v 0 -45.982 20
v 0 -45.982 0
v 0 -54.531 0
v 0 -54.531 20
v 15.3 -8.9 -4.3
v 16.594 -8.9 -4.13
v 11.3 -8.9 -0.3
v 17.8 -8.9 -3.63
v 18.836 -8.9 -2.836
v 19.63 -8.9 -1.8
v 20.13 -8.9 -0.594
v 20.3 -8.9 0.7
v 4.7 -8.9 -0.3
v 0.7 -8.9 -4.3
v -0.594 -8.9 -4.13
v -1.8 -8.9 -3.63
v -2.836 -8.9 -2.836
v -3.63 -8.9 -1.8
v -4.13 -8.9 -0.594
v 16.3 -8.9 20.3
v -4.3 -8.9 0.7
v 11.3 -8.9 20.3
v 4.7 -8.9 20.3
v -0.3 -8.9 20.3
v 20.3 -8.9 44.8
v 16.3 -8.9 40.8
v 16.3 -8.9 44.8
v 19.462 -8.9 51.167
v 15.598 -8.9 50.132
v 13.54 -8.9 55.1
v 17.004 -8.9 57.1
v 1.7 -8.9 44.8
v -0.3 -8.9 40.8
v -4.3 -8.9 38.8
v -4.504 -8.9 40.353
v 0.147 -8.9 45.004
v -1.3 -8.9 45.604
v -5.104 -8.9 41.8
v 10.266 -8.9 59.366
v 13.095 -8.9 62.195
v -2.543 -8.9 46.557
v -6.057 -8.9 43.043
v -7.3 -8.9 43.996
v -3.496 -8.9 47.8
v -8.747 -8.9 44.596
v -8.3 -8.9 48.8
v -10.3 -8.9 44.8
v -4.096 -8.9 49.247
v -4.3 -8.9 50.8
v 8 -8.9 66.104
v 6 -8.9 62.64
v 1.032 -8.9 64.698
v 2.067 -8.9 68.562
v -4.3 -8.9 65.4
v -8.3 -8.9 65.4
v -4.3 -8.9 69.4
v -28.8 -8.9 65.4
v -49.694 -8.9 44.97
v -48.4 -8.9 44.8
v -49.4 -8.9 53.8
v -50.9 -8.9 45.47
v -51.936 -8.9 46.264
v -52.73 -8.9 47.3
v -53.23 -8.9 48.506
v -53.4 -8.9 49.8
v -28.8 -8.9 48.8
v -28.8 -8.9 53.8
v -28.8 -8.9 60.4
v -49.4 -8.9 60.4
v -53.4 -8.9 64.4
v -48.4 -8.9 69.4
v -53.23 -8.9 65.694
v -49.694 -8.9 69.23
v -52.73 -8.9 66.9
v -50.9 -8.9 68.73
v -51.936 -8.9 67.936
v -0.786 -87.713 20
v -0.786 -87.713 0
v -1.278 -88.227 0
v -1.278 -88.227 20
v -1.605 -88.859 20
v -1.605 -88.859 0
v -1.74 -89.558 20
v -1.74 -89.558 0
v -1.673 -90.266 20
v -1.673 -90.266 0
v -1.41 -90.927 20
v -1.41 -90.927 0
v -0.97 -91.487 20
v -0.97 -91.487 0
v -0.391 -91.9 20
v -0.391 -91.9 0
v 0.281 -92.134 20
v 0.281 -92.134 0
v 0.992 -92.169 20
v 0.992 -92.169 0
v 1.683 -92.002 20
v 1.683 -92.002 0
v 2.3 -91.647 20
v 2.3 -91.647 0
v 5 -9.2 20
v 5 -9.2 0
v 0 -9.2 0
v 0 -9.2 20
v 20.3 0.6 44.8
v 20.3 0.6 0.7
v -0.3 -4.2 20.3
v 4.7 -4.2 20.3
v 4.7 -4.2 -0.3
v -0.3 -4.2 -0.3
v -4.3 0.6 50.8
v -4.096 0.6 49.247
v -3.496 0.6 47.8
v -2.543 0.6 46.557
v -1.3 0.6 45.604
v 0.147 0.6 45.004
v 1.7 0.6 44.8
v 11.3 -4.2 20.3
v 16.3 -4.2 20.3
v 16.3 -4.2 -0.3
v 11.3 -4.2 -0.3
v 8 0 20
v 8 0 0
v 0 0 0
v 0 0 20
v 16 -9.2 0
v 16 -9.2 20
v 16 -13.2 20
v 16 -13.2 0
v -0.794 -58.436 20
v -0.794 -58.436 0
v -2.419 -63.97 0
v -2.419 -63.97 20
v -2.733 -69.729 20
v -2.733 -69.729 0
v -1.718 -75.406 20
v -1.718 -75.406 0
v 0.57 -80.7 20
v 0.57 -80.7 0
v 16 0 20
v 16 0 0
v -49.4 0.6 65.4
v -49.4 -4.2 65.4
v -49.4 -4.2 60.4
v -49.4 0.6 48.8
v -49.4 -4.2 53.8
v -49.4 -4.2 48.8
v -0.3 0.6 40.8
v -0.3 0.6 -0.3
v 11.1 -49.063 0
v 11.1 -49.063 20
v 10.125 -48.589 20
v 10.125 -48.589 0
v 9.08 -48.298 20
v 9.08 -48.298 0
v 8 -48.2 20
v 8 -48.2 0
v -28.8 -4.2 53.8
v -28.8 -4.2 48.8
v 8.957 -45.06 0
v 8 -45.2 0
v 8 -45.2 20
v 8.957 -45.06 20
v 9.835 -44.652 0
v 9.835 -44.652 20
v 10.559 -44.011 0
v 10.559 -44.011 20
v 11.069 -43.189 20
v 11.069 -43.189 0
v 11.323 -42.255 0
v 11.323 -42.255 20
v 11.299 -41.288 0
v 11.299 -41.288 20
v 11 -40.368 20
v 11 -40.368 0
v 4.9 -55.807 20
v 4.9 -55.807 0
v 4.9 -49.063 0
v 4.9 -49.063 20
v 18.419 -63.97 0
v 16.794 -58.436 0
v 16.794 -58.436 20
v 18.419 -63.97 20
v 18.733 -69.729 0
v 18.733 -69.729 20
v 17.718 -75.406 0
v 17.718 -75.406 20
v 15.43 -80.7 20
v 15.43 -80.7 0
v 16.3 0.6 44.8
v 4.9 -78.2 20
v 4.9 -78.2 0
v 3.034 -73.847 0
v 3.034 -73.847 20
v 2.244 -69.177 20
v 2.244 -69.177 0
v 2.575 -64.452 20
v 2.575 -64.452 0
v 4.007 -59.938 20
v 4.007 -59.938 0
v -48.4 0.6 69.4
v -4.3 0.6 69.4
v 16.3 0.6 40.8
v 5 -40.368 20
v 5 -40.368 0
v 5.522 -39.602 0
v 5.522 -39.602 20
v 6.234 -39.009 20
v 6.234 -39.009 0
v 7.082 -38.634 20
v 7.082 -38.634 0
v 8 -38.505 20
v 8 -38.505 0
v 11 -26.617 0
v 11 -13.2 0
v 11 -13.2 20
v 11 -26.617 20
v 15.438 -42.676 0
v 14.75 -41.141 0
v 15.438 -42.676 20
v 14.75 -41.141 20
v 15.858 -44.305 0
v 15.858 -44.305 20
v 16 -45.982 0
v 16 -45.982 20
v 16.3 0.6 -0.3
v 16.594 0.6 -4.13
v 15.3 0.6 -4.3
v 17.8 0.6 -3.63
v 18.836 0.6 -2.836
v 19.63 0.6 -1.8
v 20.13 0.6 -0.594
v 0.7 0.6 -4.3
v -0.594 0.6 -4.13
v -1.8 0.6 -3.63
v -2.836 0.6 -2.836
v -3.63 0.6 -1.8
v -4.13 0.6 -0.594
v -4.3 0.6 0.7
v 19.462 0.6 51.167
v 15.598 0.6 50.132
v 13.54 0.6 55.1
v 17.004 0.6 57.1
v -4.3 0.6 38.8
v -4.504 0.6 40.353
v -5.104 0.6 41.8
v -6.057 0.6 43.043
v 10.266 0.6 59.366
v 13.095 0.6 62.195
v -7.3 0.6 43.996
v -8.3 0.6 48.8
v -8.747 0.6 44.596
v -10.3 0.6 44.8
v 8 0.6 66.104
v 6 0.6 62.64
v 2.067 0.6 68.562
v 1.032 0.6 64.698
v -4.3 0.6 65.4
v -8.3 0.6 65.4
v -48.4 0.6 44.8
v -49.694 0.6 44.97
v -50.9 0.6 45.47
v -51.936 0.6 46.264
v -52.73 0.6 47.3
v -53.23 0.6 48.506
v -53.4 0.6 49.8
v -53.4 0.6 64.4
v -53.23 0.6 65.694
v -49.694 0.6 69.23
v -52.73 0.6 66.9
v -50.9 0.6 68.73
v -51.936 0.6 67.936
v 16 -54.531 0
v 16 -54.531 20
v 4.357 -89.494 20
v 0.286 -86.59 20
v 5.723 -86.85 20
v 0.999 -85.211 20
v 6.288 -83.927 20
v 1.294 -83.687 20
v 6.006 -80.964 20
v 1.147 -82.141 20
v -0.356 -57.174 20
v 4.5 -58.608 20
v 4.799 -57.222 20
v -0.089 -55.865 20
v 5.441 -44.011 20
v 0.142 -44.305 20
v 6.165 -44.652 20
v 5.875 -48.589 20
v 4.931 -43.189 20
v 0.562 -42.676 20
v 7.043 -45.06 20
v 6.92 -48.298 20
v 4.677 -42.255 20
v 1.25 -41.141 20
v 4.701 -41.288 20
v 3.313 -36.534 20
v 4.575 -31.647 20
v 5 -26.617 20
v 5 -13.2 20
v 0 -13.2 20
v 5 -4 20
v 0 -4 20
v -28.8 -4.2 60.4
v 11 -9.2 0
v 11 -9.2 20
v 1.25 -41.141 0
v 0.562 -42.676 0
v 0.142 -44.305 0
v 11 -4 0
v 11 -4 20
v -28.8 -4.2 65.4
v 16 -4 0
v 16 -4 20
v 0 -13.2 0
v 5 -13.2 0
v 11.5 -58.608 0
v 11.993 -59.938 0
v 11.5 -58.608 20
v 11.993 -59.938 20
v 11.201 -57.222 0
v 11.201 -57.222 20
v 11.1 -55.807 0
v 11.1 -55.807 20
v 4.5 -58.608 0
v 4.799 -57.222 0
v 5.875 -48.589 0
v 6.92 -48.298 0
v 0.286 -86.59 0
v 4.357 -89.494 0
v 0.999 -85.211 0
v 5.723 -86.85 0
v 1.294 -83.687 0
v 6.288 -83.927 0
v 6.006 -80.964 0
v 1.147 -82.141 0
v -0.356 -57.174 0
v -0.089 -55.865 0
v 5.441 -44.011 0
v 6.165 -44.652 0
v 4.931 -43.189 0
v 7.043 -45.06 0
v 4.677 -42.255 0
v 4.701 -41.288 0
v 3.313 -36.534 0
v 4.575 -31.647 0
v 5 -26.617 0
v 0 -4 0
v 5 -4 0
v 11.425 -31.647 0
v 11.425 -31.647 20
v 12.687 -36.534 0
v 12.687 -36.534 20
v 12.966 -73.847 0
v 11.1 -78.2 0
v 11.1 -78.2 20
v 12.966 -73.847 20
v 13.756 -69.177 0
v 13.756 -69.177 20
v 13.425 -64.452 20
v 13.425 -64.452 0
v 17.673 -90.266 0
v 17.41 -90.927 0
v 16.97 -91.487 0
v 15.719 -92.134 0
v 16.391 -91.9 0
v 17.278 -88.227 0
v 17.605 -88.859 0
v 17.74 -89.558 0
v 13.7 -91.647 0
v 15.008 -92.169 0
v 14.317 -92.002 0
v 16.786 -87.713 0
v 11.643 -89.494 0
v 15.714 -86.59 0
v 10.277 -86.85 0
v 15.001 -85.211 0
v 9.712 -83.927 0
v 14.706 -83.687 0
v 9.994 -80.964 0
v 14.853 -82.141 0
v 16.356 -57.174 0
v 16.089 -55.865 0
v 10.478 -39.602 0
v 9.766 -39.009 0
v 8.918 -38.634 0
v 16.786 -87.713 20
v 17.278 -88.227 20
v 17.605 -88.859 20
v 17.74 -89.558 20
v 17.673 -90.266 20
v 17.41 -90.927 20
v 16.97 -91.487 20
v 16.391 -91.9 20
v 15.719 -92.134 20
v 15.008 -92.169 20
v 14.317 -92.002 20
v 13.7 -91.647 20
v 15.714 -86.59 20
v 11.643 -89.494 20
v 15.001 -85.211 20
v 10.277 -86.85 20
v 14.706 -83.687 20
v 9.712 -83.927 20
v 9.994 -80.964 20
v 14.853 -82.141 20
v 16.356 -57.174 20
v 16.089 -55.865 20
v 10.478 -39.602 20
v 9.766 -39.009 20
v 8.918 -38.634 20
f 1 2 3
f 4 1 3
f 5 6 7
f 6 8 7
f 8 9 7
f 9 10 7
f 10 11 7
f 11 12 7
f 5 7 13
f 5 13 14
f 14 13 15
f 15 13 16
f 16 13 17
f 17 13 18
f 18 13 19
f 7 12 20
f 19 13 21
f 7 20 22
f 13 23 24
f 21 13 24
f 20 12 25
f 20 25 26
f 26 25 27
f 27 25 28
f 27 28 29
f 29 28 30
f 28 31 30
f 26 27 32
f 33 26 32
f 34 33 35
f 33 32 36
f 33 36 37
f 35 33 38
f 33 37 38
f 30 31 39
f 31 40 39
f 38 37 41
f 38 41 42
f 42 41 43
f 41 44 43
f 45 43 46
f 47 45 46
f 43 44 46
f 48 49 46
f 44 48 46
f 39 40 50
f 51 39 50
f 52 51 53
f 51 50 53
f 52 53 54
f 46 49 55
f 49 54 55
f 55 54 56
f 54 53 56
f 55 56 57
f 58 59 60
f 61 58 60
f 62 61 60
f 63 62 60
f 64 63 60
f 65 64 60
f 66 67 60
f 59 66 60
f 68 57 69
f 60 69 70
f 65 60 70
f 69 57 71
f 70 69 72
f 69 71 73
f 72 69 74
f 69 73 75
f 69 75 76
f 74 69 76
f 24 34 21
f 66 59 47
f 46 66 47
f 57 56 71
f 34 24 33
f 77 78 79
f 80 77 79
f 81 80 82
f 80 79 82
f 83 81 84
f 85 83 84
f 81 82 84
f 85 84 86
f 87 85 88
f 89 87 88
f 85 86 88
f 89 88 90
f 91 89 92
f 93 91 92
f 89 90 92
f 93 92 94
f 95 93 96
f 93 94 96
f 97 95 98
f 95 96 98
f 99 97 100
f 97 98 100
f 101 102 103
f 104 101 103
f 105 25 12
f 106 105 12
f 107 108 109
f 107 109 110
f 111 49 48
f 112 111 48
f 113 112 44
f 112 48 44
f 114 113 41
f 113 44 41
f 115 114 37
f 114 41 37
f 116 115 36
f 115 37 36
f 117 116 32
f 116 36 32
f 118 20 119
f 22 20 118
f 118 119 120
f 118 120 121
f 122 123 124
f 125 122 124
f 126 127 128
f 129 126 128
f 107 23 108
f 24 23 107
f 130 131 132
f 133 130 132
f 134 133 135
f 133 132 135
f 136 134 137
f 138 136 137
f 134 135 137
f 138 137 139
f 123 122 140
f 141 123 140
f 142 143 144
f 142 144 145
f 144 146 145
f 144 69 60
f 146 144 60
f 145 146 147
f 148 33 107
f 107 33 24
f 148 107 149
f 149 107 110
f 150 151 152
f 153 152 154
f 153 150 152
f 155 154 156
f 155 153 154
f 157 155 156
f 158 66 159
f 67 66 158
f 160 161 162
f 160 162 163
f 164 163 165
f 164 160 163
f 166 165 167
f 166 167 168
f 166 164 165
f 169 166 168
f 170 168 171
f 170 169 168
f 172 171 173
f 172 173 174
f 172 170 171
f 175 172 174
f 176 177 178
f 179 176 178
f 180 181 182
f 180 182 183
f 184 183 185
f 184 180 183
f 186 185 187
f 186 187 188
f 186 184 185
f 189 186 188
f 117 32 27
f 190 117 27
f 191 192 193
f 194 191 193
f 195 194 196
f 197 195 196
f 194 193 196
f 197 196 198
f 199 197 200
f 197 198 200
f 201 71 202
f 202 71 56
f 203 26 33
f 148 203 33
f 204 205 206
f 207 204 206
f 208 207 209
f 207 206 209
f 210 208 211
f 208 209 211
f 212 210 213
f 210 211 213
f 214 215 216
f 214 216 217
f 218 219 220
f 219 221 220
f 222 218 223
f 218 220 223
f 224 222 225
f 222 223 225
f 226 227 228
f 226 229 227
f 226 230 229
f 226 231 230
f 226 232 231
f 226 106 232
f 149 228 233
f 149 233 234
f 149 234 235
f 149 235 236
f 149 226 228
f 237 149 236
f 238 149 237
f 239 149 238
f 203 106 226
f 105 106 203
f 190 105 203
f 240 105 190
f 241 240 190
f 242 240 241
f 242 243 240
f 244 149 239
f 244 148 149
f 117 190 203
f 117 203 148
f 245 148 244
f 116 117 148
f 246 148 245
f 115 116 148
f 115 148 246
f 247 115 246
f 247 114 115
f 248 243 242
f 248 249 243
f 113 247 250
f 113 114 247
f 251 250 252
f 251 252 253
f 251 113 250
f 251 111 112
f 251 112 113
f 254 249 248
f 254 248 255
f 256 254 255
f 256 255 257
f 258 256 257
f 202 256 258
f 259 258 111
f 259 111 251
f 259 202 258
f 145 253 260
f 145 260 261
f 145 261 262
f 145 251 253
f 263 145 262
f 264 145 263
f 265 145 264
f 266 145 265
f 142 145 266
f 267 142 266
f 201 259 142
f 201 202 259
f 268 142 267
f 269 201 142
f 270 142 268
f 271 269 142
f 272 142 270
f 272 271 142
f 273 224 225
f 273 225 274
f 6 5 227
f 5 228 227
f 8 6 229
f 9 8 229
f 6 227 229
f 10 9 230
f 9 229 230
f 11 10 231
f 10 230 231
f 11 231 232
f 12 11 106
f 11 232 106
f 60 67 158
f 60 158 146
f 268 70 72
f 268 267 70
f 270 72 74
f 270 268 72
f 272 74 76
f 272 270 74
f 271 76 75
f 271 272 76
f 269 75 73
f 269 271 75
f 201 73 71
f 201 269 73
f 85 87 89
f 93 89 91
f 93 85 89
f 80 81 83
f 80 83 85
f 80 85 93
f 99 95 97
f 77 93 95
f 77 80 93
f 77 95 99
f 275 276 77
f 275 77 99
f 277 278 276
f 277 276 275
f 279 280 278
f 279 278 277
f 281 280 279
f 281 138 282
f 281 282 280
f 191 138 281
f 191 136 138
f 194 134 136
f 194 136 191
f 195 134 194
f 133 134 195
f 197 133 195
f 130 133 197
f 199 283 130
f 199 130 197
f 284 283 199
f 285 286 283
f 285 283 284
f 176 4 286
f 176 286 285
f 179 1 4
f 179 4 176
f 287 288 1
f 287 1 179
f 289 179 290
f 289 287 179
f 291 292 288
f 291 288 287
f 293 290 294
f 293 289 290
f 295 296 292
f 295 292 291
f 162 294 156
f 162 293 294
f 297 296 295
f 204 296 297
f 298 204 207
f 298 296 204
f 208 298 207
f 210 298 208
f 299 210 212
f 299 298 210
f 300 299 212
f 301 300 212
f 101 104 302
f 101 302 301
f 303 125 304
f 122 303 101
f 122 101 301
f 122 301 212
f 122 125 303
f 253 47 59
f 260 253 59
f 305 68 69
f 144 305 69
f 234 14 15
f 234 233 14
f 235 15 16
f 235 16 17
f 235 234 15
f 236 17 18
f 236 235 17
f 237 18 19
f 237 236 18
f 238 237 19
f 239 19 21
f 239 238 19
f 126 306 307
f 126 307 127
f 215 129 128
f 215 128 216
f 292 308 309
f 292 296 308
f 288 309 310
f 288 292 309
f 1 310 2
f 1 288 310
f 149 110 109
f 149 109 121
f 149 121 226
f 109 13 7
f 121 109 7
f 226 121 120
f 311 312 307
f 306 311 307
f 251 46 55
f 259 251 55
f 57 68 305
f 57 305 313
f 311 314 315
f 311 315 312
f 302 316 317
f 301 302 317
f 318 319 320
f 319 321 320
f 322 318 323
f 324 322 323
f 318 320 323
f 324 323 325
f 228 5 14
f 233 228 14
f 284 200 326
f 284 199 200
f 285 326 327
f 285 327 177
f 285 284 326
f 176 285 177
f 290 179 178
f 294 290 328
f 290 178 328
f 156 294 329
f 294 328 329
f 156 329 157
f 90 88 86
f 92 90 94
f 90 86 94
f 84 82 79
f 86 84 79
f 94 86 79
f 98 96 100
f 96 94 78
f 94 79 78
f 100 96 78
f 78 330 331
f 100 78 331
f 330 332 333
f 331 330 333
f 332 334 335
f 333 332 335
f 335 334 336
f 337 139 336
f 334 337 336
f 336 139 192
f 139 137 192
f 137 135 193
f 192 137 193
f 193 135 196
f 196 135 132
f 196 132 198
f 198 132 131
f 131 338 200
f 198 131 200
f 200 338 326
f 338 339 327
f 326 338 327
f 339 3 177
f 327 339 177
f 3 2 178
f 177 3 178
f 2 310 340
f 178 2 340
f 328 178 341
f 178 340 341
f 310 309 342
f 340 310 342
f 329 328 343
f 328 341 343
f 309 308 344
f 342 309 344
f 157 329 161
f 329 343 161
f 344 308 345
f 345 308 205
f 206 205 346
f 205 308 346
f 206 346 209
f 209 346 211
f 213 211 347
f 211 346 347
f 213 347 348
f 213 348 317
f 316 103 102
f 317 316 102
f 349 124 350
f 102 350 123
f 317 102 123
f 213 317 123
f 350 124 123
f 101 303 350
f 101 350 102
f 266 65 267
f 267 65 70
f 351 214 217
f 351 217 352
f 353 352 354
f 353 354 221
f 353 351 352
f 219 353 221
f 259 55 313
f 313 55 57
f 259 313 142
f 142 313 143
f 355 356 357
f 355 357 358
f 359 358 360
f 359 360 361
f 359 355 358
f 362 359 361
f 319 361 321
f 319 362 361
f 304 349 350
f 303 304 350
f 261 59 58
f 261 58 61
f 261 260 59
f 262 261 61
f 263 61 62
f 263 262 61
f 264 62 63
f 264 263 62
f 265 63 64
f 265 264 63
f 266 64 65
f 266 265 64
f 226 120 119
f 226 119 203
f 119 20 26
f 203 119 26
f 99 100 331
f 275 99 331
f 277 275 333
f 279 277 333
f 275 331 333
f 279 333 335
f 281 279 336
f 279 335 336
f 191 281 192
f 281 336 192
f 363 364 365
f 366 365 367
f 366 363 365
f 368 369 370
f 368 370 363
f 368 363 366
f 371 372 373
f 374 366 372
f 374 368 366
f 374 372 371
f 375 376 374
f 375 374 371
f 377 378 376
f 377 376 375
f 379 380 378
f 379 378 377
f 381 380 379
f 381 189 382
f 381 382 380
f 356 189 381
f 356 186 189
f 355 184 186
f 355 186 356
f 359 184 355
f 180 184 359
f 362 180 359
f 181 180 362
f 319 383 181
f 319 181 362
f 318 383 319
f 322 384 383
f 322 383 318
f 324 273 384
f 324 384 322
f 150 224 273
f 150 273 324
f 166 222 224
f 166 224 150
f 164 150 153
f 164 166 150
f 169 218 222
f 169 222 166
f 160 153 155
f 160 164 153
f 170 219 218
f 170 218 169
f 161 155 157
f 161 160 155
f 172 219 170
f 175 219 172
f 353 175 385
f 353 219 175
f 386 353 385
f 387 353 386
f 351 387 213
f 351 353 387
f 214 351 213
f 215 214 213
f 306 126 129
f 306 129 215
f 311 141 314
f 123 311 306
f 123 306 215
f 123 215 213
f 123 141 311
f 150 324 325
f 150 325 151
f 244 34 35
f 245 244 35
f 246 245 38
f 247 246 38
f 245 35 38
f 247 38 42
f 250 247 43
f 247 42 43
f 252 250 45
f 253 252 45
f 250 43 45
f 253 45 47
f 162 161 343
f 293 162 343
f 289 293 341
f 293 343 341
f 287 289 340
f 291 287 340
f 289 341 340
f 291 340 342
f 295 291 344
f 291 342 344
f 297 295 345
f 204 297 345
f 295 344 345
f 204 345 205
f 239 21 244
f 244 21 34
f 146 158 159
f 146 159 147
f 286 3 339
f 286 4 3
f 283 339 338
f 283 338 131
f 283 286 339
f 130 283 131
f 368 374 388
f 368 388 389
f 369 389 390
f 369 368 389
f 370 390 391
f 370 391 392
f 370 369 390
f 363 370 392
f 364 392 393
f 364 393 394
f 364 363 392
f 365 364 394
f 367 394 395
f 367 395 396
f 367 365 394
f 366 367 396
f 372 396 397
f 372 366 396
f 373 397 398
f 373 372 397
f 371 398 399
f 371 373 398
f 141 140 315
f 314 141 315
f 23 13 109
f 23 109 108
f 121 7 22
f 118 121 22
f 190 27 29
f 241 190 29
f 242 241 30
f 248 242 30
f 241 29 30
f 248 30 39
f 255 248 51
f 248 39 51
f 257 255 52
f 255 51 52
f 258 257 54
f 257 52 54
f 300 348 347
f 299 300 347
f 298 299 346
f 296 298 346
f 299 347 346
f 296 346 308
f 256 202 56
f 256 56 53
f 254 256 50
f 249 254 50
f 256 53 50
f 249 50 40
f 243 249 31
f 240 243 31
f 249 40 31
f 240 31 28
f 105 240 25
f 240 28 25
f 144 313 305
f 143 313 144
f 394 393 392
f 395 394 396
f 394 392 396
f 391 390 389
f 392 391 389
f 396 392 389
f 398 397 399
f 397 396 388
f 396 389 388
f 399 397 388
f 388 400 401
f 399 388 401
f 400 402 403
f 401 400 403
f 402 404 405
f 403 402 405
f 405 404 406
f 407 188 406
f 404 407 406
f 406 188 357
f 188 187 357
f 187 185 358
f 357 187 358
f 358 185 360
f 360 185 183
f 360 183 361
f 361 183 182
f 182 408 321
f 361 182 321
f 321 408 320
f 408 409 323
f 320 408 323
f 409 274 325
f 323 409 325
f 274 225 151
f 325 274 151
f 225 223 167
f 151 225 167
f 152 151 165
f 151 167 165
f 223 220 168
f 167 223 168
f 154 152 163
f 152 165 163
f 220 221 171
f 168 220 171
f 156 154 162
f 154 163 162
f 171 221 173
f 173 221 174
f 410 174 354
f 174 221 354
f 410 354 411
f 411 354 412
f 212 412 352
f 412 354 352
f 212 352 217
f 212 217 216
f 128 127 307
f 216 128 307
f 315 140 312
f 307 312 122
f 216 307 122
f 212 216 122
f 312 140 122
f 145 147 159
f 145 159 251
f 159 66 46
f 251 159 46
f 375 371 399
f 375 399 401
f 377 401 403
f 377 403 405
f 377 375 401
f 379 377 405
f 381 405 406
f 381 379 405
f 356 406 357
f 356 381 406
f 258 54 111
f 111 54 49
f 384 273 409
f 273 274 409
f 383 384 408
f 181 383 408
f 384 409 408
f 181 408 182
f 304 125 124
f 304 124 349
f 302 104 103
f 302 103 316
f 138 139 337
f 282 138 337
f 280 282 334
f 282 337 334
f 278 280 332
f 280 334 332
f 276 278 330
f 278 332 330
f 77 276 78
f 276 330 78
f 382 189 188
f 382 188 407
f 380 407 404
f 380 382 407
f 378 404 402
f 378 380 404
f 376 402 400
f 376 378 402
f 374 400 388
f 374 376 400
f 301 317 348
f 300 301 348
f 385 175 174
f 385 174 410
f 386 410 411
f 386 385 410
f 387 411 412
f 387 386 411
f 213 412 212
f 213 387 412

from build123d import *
from build123d import SkipClean  # not in build123d's __all__

# Parameters (mm, degrees)
F1_DEPTH = 20
F2_R     = 10
F6_DEPTH = 9.5
F5_W     = 20.6
F5_H     = 5
F5_W_2   = 5
F5_H_2   = 20.6
F7_DEPTH = 4.7
F8_R     = 5


with BuildPart() as f1:
    # F0 (on Top) → F1 (new body)
    with BuildSketch(Plane.XY):
        with BuildLine():
            Line((8, 0), (0, 0))
            Line((0, 0), (0, -4))
            Line((0, -4), (5, -4))
            Line((5, -4), (5, -9.2))
            Line((5, -9.2), (0, -9.2))
            Line((0, -9.2), (0, -13.2))
            Line((0, -13.2), (5, -13.2))
            Line((5, -13.2), (5, -26.6168760482))
            Line((5, -26.6168760482), (5, -40.3678421966))
            ThreePointArc((5, -40.3678421966), (6.234427286, -39.0088181315), (8, -38.5053202414))
            Line((8, -38.5053202414), (8, 0))
        make_face()
        with BuildLine():
            Line((8, -48.2), (8, -45.2))
            ThreePointArc((8, -45.2), (5.1561580109, -43.6182328347), (5, -40.3678421966))
            Line((5, -40.3678421966), (5, -26.6168760482))
            ThreePointArc((5, -26.6168760482), (3.7228132327, -35.2771300861), (0, -43.2))
            Line((0, -43.2), (0, -56.7436034959))
            ThreePointArc((0, -56.7436034959), (-2.7724216072, -68.7945299554), (0.5698729811, -80.7))
            ThreePointArc((0.5698729811, -80.7), (1.2008963786, -84.4594516542), (-0.7860771969, -87.7126966924))
            ThreePointArc((-0.7860771969, -87.7126966924), (-1.2100240798, -91.2227207722), (2.3, -91.6466676551))
            ThreePointArc((2.3, -91.6466676551), (6.109971325, -85.4086529871), (4.9, -78.2))
            ThreePointArc((4.9, -78.2), (2.2205080757, -68.2), (4.9, -58.2))
            Line((4.9, -58.2), (4.9, -49.0628801844))
            ThreePointArc((4.9, -49.0628801844), (6.3910747211, -48.4197439982), (8, -48.2))
        make_face()
    extrude(amount=F1_DEPTH)

    # F2
    f2_edges = [f1.edges().sort_by_distance(p)[0] for p in [
        (4.9, -58.2, 10),
        (0, -56.743603, 10),
        (0, -43.2, 10),
    ]]
    fillet(f2_edges, radius=F2_R)

    # F3: F1 across face


with BuildPart() as f1_1:
    add(f1.part, clean=False)
    with SkipClean():  # cleaning this boolean's faces spoils the solid; the shape is the same uncleaned
        add(f1.part.mirror(Plane(origin=(8, -19.2526601207, 10), x_dir=(0, 1, 0), z_dir=(1, 0, 0))), clean=False)


with BuildPart() as f6:
    # F5 (on offset) → F6 (new body)
    with BuildSketch(Plane(origin=(0, -8.9, 0), x_dir=(-1, 0, 0), z_dir=(0, 1, 0))):
        with BuildLine():
            Line((-20.3, -4.3), (4.3, -4.3))
            Line((4.3, -4.3), (4.3, 38.8))
            ThreePointArc((4.3, 38.8), (6.0573593129, 43.0426406871), (10.3, 44.8))
            Line((10.3, 44.8), (53.4, 44.8))
            Line((53.4, 44.8), (53.4, 69.4))
            Line((53.4, 69.4), (4.3, 69.4))
            ThreePointArc((4.3, 69.4), (-13.0948268172, 62.1948268172), (-20.3, 44.8))
            Line((-20.3, 44.8), (-20.3, -4.3))
        make_face()
        Polygon((0.3, -0.3), (-4.7, -0.3), (-11.3, -0.3), (-16.3, -0.3), (-16.3, 20.3), (-16.3, 40.8), (0.3, 40.8), (0.3, 20.3), align=None, mode=Mode.SUBTRACT)
        with BuildLine():
            ThreePointArc((4.3, 50.8), (2.5426406871, 46.5573593129), (-1.7, 44.8))
            Line((-1.7, 44.8), (-16.3, 44.8))
            ThreePointArc((-16.3, 44.8), (-10.2663996924, 59.3663996924), (4.3, 65.4))
            Line((4.3, 65.4), (4.3, 50.8))
        make_face(mode=Mode.SUBTRACT)
        Polygon((8.3, 65.4), (28.8, 65.4), (49.4, 65.4), (49.4, 60.4), (49.4, 53.8), (49.4, 48.8), (28.8, 48.8), (8.3, 48.8), align=None, mode=Mode.SUBTRACT)
    extrude(amount=F6_DEPTH)

    # F5 (on offset) → F7 (join)
    with BuildSketch(Plane(origin=(0, -8.9, 0), x_dir=(-1, 0, 0), z_dir=(0, 1, 0))):
        with Locations((39.1, 51.3)):
            Rectangle(F5_W, F5_H)
        with Locations((39.1, 62.9)):
            Rectangle(F5_W, F5_H)
        with Locations((-13.8, 10)):
            Rectangle(F5_W_2, F5_H_2)
        with Locations((-2.2, 10)):
            Rectangle(F5_W_2, F5_H_2)
    extrude(amount=F7_DEPTH)

    # F8
    f8_edges = [f6.edges().sort_by_distance(p)[0] for p in [
        (-53.4, -4.15, 44.8),
        (-53.4, -4.15, 69.4),
        (20.3, -4.15, -4.3),
        (-4.3, -4.15, -4.3),
    ]]
    fillet(f8_edges, radius=F8_R)


solid = Compound([f1_1.part, f6.part])
